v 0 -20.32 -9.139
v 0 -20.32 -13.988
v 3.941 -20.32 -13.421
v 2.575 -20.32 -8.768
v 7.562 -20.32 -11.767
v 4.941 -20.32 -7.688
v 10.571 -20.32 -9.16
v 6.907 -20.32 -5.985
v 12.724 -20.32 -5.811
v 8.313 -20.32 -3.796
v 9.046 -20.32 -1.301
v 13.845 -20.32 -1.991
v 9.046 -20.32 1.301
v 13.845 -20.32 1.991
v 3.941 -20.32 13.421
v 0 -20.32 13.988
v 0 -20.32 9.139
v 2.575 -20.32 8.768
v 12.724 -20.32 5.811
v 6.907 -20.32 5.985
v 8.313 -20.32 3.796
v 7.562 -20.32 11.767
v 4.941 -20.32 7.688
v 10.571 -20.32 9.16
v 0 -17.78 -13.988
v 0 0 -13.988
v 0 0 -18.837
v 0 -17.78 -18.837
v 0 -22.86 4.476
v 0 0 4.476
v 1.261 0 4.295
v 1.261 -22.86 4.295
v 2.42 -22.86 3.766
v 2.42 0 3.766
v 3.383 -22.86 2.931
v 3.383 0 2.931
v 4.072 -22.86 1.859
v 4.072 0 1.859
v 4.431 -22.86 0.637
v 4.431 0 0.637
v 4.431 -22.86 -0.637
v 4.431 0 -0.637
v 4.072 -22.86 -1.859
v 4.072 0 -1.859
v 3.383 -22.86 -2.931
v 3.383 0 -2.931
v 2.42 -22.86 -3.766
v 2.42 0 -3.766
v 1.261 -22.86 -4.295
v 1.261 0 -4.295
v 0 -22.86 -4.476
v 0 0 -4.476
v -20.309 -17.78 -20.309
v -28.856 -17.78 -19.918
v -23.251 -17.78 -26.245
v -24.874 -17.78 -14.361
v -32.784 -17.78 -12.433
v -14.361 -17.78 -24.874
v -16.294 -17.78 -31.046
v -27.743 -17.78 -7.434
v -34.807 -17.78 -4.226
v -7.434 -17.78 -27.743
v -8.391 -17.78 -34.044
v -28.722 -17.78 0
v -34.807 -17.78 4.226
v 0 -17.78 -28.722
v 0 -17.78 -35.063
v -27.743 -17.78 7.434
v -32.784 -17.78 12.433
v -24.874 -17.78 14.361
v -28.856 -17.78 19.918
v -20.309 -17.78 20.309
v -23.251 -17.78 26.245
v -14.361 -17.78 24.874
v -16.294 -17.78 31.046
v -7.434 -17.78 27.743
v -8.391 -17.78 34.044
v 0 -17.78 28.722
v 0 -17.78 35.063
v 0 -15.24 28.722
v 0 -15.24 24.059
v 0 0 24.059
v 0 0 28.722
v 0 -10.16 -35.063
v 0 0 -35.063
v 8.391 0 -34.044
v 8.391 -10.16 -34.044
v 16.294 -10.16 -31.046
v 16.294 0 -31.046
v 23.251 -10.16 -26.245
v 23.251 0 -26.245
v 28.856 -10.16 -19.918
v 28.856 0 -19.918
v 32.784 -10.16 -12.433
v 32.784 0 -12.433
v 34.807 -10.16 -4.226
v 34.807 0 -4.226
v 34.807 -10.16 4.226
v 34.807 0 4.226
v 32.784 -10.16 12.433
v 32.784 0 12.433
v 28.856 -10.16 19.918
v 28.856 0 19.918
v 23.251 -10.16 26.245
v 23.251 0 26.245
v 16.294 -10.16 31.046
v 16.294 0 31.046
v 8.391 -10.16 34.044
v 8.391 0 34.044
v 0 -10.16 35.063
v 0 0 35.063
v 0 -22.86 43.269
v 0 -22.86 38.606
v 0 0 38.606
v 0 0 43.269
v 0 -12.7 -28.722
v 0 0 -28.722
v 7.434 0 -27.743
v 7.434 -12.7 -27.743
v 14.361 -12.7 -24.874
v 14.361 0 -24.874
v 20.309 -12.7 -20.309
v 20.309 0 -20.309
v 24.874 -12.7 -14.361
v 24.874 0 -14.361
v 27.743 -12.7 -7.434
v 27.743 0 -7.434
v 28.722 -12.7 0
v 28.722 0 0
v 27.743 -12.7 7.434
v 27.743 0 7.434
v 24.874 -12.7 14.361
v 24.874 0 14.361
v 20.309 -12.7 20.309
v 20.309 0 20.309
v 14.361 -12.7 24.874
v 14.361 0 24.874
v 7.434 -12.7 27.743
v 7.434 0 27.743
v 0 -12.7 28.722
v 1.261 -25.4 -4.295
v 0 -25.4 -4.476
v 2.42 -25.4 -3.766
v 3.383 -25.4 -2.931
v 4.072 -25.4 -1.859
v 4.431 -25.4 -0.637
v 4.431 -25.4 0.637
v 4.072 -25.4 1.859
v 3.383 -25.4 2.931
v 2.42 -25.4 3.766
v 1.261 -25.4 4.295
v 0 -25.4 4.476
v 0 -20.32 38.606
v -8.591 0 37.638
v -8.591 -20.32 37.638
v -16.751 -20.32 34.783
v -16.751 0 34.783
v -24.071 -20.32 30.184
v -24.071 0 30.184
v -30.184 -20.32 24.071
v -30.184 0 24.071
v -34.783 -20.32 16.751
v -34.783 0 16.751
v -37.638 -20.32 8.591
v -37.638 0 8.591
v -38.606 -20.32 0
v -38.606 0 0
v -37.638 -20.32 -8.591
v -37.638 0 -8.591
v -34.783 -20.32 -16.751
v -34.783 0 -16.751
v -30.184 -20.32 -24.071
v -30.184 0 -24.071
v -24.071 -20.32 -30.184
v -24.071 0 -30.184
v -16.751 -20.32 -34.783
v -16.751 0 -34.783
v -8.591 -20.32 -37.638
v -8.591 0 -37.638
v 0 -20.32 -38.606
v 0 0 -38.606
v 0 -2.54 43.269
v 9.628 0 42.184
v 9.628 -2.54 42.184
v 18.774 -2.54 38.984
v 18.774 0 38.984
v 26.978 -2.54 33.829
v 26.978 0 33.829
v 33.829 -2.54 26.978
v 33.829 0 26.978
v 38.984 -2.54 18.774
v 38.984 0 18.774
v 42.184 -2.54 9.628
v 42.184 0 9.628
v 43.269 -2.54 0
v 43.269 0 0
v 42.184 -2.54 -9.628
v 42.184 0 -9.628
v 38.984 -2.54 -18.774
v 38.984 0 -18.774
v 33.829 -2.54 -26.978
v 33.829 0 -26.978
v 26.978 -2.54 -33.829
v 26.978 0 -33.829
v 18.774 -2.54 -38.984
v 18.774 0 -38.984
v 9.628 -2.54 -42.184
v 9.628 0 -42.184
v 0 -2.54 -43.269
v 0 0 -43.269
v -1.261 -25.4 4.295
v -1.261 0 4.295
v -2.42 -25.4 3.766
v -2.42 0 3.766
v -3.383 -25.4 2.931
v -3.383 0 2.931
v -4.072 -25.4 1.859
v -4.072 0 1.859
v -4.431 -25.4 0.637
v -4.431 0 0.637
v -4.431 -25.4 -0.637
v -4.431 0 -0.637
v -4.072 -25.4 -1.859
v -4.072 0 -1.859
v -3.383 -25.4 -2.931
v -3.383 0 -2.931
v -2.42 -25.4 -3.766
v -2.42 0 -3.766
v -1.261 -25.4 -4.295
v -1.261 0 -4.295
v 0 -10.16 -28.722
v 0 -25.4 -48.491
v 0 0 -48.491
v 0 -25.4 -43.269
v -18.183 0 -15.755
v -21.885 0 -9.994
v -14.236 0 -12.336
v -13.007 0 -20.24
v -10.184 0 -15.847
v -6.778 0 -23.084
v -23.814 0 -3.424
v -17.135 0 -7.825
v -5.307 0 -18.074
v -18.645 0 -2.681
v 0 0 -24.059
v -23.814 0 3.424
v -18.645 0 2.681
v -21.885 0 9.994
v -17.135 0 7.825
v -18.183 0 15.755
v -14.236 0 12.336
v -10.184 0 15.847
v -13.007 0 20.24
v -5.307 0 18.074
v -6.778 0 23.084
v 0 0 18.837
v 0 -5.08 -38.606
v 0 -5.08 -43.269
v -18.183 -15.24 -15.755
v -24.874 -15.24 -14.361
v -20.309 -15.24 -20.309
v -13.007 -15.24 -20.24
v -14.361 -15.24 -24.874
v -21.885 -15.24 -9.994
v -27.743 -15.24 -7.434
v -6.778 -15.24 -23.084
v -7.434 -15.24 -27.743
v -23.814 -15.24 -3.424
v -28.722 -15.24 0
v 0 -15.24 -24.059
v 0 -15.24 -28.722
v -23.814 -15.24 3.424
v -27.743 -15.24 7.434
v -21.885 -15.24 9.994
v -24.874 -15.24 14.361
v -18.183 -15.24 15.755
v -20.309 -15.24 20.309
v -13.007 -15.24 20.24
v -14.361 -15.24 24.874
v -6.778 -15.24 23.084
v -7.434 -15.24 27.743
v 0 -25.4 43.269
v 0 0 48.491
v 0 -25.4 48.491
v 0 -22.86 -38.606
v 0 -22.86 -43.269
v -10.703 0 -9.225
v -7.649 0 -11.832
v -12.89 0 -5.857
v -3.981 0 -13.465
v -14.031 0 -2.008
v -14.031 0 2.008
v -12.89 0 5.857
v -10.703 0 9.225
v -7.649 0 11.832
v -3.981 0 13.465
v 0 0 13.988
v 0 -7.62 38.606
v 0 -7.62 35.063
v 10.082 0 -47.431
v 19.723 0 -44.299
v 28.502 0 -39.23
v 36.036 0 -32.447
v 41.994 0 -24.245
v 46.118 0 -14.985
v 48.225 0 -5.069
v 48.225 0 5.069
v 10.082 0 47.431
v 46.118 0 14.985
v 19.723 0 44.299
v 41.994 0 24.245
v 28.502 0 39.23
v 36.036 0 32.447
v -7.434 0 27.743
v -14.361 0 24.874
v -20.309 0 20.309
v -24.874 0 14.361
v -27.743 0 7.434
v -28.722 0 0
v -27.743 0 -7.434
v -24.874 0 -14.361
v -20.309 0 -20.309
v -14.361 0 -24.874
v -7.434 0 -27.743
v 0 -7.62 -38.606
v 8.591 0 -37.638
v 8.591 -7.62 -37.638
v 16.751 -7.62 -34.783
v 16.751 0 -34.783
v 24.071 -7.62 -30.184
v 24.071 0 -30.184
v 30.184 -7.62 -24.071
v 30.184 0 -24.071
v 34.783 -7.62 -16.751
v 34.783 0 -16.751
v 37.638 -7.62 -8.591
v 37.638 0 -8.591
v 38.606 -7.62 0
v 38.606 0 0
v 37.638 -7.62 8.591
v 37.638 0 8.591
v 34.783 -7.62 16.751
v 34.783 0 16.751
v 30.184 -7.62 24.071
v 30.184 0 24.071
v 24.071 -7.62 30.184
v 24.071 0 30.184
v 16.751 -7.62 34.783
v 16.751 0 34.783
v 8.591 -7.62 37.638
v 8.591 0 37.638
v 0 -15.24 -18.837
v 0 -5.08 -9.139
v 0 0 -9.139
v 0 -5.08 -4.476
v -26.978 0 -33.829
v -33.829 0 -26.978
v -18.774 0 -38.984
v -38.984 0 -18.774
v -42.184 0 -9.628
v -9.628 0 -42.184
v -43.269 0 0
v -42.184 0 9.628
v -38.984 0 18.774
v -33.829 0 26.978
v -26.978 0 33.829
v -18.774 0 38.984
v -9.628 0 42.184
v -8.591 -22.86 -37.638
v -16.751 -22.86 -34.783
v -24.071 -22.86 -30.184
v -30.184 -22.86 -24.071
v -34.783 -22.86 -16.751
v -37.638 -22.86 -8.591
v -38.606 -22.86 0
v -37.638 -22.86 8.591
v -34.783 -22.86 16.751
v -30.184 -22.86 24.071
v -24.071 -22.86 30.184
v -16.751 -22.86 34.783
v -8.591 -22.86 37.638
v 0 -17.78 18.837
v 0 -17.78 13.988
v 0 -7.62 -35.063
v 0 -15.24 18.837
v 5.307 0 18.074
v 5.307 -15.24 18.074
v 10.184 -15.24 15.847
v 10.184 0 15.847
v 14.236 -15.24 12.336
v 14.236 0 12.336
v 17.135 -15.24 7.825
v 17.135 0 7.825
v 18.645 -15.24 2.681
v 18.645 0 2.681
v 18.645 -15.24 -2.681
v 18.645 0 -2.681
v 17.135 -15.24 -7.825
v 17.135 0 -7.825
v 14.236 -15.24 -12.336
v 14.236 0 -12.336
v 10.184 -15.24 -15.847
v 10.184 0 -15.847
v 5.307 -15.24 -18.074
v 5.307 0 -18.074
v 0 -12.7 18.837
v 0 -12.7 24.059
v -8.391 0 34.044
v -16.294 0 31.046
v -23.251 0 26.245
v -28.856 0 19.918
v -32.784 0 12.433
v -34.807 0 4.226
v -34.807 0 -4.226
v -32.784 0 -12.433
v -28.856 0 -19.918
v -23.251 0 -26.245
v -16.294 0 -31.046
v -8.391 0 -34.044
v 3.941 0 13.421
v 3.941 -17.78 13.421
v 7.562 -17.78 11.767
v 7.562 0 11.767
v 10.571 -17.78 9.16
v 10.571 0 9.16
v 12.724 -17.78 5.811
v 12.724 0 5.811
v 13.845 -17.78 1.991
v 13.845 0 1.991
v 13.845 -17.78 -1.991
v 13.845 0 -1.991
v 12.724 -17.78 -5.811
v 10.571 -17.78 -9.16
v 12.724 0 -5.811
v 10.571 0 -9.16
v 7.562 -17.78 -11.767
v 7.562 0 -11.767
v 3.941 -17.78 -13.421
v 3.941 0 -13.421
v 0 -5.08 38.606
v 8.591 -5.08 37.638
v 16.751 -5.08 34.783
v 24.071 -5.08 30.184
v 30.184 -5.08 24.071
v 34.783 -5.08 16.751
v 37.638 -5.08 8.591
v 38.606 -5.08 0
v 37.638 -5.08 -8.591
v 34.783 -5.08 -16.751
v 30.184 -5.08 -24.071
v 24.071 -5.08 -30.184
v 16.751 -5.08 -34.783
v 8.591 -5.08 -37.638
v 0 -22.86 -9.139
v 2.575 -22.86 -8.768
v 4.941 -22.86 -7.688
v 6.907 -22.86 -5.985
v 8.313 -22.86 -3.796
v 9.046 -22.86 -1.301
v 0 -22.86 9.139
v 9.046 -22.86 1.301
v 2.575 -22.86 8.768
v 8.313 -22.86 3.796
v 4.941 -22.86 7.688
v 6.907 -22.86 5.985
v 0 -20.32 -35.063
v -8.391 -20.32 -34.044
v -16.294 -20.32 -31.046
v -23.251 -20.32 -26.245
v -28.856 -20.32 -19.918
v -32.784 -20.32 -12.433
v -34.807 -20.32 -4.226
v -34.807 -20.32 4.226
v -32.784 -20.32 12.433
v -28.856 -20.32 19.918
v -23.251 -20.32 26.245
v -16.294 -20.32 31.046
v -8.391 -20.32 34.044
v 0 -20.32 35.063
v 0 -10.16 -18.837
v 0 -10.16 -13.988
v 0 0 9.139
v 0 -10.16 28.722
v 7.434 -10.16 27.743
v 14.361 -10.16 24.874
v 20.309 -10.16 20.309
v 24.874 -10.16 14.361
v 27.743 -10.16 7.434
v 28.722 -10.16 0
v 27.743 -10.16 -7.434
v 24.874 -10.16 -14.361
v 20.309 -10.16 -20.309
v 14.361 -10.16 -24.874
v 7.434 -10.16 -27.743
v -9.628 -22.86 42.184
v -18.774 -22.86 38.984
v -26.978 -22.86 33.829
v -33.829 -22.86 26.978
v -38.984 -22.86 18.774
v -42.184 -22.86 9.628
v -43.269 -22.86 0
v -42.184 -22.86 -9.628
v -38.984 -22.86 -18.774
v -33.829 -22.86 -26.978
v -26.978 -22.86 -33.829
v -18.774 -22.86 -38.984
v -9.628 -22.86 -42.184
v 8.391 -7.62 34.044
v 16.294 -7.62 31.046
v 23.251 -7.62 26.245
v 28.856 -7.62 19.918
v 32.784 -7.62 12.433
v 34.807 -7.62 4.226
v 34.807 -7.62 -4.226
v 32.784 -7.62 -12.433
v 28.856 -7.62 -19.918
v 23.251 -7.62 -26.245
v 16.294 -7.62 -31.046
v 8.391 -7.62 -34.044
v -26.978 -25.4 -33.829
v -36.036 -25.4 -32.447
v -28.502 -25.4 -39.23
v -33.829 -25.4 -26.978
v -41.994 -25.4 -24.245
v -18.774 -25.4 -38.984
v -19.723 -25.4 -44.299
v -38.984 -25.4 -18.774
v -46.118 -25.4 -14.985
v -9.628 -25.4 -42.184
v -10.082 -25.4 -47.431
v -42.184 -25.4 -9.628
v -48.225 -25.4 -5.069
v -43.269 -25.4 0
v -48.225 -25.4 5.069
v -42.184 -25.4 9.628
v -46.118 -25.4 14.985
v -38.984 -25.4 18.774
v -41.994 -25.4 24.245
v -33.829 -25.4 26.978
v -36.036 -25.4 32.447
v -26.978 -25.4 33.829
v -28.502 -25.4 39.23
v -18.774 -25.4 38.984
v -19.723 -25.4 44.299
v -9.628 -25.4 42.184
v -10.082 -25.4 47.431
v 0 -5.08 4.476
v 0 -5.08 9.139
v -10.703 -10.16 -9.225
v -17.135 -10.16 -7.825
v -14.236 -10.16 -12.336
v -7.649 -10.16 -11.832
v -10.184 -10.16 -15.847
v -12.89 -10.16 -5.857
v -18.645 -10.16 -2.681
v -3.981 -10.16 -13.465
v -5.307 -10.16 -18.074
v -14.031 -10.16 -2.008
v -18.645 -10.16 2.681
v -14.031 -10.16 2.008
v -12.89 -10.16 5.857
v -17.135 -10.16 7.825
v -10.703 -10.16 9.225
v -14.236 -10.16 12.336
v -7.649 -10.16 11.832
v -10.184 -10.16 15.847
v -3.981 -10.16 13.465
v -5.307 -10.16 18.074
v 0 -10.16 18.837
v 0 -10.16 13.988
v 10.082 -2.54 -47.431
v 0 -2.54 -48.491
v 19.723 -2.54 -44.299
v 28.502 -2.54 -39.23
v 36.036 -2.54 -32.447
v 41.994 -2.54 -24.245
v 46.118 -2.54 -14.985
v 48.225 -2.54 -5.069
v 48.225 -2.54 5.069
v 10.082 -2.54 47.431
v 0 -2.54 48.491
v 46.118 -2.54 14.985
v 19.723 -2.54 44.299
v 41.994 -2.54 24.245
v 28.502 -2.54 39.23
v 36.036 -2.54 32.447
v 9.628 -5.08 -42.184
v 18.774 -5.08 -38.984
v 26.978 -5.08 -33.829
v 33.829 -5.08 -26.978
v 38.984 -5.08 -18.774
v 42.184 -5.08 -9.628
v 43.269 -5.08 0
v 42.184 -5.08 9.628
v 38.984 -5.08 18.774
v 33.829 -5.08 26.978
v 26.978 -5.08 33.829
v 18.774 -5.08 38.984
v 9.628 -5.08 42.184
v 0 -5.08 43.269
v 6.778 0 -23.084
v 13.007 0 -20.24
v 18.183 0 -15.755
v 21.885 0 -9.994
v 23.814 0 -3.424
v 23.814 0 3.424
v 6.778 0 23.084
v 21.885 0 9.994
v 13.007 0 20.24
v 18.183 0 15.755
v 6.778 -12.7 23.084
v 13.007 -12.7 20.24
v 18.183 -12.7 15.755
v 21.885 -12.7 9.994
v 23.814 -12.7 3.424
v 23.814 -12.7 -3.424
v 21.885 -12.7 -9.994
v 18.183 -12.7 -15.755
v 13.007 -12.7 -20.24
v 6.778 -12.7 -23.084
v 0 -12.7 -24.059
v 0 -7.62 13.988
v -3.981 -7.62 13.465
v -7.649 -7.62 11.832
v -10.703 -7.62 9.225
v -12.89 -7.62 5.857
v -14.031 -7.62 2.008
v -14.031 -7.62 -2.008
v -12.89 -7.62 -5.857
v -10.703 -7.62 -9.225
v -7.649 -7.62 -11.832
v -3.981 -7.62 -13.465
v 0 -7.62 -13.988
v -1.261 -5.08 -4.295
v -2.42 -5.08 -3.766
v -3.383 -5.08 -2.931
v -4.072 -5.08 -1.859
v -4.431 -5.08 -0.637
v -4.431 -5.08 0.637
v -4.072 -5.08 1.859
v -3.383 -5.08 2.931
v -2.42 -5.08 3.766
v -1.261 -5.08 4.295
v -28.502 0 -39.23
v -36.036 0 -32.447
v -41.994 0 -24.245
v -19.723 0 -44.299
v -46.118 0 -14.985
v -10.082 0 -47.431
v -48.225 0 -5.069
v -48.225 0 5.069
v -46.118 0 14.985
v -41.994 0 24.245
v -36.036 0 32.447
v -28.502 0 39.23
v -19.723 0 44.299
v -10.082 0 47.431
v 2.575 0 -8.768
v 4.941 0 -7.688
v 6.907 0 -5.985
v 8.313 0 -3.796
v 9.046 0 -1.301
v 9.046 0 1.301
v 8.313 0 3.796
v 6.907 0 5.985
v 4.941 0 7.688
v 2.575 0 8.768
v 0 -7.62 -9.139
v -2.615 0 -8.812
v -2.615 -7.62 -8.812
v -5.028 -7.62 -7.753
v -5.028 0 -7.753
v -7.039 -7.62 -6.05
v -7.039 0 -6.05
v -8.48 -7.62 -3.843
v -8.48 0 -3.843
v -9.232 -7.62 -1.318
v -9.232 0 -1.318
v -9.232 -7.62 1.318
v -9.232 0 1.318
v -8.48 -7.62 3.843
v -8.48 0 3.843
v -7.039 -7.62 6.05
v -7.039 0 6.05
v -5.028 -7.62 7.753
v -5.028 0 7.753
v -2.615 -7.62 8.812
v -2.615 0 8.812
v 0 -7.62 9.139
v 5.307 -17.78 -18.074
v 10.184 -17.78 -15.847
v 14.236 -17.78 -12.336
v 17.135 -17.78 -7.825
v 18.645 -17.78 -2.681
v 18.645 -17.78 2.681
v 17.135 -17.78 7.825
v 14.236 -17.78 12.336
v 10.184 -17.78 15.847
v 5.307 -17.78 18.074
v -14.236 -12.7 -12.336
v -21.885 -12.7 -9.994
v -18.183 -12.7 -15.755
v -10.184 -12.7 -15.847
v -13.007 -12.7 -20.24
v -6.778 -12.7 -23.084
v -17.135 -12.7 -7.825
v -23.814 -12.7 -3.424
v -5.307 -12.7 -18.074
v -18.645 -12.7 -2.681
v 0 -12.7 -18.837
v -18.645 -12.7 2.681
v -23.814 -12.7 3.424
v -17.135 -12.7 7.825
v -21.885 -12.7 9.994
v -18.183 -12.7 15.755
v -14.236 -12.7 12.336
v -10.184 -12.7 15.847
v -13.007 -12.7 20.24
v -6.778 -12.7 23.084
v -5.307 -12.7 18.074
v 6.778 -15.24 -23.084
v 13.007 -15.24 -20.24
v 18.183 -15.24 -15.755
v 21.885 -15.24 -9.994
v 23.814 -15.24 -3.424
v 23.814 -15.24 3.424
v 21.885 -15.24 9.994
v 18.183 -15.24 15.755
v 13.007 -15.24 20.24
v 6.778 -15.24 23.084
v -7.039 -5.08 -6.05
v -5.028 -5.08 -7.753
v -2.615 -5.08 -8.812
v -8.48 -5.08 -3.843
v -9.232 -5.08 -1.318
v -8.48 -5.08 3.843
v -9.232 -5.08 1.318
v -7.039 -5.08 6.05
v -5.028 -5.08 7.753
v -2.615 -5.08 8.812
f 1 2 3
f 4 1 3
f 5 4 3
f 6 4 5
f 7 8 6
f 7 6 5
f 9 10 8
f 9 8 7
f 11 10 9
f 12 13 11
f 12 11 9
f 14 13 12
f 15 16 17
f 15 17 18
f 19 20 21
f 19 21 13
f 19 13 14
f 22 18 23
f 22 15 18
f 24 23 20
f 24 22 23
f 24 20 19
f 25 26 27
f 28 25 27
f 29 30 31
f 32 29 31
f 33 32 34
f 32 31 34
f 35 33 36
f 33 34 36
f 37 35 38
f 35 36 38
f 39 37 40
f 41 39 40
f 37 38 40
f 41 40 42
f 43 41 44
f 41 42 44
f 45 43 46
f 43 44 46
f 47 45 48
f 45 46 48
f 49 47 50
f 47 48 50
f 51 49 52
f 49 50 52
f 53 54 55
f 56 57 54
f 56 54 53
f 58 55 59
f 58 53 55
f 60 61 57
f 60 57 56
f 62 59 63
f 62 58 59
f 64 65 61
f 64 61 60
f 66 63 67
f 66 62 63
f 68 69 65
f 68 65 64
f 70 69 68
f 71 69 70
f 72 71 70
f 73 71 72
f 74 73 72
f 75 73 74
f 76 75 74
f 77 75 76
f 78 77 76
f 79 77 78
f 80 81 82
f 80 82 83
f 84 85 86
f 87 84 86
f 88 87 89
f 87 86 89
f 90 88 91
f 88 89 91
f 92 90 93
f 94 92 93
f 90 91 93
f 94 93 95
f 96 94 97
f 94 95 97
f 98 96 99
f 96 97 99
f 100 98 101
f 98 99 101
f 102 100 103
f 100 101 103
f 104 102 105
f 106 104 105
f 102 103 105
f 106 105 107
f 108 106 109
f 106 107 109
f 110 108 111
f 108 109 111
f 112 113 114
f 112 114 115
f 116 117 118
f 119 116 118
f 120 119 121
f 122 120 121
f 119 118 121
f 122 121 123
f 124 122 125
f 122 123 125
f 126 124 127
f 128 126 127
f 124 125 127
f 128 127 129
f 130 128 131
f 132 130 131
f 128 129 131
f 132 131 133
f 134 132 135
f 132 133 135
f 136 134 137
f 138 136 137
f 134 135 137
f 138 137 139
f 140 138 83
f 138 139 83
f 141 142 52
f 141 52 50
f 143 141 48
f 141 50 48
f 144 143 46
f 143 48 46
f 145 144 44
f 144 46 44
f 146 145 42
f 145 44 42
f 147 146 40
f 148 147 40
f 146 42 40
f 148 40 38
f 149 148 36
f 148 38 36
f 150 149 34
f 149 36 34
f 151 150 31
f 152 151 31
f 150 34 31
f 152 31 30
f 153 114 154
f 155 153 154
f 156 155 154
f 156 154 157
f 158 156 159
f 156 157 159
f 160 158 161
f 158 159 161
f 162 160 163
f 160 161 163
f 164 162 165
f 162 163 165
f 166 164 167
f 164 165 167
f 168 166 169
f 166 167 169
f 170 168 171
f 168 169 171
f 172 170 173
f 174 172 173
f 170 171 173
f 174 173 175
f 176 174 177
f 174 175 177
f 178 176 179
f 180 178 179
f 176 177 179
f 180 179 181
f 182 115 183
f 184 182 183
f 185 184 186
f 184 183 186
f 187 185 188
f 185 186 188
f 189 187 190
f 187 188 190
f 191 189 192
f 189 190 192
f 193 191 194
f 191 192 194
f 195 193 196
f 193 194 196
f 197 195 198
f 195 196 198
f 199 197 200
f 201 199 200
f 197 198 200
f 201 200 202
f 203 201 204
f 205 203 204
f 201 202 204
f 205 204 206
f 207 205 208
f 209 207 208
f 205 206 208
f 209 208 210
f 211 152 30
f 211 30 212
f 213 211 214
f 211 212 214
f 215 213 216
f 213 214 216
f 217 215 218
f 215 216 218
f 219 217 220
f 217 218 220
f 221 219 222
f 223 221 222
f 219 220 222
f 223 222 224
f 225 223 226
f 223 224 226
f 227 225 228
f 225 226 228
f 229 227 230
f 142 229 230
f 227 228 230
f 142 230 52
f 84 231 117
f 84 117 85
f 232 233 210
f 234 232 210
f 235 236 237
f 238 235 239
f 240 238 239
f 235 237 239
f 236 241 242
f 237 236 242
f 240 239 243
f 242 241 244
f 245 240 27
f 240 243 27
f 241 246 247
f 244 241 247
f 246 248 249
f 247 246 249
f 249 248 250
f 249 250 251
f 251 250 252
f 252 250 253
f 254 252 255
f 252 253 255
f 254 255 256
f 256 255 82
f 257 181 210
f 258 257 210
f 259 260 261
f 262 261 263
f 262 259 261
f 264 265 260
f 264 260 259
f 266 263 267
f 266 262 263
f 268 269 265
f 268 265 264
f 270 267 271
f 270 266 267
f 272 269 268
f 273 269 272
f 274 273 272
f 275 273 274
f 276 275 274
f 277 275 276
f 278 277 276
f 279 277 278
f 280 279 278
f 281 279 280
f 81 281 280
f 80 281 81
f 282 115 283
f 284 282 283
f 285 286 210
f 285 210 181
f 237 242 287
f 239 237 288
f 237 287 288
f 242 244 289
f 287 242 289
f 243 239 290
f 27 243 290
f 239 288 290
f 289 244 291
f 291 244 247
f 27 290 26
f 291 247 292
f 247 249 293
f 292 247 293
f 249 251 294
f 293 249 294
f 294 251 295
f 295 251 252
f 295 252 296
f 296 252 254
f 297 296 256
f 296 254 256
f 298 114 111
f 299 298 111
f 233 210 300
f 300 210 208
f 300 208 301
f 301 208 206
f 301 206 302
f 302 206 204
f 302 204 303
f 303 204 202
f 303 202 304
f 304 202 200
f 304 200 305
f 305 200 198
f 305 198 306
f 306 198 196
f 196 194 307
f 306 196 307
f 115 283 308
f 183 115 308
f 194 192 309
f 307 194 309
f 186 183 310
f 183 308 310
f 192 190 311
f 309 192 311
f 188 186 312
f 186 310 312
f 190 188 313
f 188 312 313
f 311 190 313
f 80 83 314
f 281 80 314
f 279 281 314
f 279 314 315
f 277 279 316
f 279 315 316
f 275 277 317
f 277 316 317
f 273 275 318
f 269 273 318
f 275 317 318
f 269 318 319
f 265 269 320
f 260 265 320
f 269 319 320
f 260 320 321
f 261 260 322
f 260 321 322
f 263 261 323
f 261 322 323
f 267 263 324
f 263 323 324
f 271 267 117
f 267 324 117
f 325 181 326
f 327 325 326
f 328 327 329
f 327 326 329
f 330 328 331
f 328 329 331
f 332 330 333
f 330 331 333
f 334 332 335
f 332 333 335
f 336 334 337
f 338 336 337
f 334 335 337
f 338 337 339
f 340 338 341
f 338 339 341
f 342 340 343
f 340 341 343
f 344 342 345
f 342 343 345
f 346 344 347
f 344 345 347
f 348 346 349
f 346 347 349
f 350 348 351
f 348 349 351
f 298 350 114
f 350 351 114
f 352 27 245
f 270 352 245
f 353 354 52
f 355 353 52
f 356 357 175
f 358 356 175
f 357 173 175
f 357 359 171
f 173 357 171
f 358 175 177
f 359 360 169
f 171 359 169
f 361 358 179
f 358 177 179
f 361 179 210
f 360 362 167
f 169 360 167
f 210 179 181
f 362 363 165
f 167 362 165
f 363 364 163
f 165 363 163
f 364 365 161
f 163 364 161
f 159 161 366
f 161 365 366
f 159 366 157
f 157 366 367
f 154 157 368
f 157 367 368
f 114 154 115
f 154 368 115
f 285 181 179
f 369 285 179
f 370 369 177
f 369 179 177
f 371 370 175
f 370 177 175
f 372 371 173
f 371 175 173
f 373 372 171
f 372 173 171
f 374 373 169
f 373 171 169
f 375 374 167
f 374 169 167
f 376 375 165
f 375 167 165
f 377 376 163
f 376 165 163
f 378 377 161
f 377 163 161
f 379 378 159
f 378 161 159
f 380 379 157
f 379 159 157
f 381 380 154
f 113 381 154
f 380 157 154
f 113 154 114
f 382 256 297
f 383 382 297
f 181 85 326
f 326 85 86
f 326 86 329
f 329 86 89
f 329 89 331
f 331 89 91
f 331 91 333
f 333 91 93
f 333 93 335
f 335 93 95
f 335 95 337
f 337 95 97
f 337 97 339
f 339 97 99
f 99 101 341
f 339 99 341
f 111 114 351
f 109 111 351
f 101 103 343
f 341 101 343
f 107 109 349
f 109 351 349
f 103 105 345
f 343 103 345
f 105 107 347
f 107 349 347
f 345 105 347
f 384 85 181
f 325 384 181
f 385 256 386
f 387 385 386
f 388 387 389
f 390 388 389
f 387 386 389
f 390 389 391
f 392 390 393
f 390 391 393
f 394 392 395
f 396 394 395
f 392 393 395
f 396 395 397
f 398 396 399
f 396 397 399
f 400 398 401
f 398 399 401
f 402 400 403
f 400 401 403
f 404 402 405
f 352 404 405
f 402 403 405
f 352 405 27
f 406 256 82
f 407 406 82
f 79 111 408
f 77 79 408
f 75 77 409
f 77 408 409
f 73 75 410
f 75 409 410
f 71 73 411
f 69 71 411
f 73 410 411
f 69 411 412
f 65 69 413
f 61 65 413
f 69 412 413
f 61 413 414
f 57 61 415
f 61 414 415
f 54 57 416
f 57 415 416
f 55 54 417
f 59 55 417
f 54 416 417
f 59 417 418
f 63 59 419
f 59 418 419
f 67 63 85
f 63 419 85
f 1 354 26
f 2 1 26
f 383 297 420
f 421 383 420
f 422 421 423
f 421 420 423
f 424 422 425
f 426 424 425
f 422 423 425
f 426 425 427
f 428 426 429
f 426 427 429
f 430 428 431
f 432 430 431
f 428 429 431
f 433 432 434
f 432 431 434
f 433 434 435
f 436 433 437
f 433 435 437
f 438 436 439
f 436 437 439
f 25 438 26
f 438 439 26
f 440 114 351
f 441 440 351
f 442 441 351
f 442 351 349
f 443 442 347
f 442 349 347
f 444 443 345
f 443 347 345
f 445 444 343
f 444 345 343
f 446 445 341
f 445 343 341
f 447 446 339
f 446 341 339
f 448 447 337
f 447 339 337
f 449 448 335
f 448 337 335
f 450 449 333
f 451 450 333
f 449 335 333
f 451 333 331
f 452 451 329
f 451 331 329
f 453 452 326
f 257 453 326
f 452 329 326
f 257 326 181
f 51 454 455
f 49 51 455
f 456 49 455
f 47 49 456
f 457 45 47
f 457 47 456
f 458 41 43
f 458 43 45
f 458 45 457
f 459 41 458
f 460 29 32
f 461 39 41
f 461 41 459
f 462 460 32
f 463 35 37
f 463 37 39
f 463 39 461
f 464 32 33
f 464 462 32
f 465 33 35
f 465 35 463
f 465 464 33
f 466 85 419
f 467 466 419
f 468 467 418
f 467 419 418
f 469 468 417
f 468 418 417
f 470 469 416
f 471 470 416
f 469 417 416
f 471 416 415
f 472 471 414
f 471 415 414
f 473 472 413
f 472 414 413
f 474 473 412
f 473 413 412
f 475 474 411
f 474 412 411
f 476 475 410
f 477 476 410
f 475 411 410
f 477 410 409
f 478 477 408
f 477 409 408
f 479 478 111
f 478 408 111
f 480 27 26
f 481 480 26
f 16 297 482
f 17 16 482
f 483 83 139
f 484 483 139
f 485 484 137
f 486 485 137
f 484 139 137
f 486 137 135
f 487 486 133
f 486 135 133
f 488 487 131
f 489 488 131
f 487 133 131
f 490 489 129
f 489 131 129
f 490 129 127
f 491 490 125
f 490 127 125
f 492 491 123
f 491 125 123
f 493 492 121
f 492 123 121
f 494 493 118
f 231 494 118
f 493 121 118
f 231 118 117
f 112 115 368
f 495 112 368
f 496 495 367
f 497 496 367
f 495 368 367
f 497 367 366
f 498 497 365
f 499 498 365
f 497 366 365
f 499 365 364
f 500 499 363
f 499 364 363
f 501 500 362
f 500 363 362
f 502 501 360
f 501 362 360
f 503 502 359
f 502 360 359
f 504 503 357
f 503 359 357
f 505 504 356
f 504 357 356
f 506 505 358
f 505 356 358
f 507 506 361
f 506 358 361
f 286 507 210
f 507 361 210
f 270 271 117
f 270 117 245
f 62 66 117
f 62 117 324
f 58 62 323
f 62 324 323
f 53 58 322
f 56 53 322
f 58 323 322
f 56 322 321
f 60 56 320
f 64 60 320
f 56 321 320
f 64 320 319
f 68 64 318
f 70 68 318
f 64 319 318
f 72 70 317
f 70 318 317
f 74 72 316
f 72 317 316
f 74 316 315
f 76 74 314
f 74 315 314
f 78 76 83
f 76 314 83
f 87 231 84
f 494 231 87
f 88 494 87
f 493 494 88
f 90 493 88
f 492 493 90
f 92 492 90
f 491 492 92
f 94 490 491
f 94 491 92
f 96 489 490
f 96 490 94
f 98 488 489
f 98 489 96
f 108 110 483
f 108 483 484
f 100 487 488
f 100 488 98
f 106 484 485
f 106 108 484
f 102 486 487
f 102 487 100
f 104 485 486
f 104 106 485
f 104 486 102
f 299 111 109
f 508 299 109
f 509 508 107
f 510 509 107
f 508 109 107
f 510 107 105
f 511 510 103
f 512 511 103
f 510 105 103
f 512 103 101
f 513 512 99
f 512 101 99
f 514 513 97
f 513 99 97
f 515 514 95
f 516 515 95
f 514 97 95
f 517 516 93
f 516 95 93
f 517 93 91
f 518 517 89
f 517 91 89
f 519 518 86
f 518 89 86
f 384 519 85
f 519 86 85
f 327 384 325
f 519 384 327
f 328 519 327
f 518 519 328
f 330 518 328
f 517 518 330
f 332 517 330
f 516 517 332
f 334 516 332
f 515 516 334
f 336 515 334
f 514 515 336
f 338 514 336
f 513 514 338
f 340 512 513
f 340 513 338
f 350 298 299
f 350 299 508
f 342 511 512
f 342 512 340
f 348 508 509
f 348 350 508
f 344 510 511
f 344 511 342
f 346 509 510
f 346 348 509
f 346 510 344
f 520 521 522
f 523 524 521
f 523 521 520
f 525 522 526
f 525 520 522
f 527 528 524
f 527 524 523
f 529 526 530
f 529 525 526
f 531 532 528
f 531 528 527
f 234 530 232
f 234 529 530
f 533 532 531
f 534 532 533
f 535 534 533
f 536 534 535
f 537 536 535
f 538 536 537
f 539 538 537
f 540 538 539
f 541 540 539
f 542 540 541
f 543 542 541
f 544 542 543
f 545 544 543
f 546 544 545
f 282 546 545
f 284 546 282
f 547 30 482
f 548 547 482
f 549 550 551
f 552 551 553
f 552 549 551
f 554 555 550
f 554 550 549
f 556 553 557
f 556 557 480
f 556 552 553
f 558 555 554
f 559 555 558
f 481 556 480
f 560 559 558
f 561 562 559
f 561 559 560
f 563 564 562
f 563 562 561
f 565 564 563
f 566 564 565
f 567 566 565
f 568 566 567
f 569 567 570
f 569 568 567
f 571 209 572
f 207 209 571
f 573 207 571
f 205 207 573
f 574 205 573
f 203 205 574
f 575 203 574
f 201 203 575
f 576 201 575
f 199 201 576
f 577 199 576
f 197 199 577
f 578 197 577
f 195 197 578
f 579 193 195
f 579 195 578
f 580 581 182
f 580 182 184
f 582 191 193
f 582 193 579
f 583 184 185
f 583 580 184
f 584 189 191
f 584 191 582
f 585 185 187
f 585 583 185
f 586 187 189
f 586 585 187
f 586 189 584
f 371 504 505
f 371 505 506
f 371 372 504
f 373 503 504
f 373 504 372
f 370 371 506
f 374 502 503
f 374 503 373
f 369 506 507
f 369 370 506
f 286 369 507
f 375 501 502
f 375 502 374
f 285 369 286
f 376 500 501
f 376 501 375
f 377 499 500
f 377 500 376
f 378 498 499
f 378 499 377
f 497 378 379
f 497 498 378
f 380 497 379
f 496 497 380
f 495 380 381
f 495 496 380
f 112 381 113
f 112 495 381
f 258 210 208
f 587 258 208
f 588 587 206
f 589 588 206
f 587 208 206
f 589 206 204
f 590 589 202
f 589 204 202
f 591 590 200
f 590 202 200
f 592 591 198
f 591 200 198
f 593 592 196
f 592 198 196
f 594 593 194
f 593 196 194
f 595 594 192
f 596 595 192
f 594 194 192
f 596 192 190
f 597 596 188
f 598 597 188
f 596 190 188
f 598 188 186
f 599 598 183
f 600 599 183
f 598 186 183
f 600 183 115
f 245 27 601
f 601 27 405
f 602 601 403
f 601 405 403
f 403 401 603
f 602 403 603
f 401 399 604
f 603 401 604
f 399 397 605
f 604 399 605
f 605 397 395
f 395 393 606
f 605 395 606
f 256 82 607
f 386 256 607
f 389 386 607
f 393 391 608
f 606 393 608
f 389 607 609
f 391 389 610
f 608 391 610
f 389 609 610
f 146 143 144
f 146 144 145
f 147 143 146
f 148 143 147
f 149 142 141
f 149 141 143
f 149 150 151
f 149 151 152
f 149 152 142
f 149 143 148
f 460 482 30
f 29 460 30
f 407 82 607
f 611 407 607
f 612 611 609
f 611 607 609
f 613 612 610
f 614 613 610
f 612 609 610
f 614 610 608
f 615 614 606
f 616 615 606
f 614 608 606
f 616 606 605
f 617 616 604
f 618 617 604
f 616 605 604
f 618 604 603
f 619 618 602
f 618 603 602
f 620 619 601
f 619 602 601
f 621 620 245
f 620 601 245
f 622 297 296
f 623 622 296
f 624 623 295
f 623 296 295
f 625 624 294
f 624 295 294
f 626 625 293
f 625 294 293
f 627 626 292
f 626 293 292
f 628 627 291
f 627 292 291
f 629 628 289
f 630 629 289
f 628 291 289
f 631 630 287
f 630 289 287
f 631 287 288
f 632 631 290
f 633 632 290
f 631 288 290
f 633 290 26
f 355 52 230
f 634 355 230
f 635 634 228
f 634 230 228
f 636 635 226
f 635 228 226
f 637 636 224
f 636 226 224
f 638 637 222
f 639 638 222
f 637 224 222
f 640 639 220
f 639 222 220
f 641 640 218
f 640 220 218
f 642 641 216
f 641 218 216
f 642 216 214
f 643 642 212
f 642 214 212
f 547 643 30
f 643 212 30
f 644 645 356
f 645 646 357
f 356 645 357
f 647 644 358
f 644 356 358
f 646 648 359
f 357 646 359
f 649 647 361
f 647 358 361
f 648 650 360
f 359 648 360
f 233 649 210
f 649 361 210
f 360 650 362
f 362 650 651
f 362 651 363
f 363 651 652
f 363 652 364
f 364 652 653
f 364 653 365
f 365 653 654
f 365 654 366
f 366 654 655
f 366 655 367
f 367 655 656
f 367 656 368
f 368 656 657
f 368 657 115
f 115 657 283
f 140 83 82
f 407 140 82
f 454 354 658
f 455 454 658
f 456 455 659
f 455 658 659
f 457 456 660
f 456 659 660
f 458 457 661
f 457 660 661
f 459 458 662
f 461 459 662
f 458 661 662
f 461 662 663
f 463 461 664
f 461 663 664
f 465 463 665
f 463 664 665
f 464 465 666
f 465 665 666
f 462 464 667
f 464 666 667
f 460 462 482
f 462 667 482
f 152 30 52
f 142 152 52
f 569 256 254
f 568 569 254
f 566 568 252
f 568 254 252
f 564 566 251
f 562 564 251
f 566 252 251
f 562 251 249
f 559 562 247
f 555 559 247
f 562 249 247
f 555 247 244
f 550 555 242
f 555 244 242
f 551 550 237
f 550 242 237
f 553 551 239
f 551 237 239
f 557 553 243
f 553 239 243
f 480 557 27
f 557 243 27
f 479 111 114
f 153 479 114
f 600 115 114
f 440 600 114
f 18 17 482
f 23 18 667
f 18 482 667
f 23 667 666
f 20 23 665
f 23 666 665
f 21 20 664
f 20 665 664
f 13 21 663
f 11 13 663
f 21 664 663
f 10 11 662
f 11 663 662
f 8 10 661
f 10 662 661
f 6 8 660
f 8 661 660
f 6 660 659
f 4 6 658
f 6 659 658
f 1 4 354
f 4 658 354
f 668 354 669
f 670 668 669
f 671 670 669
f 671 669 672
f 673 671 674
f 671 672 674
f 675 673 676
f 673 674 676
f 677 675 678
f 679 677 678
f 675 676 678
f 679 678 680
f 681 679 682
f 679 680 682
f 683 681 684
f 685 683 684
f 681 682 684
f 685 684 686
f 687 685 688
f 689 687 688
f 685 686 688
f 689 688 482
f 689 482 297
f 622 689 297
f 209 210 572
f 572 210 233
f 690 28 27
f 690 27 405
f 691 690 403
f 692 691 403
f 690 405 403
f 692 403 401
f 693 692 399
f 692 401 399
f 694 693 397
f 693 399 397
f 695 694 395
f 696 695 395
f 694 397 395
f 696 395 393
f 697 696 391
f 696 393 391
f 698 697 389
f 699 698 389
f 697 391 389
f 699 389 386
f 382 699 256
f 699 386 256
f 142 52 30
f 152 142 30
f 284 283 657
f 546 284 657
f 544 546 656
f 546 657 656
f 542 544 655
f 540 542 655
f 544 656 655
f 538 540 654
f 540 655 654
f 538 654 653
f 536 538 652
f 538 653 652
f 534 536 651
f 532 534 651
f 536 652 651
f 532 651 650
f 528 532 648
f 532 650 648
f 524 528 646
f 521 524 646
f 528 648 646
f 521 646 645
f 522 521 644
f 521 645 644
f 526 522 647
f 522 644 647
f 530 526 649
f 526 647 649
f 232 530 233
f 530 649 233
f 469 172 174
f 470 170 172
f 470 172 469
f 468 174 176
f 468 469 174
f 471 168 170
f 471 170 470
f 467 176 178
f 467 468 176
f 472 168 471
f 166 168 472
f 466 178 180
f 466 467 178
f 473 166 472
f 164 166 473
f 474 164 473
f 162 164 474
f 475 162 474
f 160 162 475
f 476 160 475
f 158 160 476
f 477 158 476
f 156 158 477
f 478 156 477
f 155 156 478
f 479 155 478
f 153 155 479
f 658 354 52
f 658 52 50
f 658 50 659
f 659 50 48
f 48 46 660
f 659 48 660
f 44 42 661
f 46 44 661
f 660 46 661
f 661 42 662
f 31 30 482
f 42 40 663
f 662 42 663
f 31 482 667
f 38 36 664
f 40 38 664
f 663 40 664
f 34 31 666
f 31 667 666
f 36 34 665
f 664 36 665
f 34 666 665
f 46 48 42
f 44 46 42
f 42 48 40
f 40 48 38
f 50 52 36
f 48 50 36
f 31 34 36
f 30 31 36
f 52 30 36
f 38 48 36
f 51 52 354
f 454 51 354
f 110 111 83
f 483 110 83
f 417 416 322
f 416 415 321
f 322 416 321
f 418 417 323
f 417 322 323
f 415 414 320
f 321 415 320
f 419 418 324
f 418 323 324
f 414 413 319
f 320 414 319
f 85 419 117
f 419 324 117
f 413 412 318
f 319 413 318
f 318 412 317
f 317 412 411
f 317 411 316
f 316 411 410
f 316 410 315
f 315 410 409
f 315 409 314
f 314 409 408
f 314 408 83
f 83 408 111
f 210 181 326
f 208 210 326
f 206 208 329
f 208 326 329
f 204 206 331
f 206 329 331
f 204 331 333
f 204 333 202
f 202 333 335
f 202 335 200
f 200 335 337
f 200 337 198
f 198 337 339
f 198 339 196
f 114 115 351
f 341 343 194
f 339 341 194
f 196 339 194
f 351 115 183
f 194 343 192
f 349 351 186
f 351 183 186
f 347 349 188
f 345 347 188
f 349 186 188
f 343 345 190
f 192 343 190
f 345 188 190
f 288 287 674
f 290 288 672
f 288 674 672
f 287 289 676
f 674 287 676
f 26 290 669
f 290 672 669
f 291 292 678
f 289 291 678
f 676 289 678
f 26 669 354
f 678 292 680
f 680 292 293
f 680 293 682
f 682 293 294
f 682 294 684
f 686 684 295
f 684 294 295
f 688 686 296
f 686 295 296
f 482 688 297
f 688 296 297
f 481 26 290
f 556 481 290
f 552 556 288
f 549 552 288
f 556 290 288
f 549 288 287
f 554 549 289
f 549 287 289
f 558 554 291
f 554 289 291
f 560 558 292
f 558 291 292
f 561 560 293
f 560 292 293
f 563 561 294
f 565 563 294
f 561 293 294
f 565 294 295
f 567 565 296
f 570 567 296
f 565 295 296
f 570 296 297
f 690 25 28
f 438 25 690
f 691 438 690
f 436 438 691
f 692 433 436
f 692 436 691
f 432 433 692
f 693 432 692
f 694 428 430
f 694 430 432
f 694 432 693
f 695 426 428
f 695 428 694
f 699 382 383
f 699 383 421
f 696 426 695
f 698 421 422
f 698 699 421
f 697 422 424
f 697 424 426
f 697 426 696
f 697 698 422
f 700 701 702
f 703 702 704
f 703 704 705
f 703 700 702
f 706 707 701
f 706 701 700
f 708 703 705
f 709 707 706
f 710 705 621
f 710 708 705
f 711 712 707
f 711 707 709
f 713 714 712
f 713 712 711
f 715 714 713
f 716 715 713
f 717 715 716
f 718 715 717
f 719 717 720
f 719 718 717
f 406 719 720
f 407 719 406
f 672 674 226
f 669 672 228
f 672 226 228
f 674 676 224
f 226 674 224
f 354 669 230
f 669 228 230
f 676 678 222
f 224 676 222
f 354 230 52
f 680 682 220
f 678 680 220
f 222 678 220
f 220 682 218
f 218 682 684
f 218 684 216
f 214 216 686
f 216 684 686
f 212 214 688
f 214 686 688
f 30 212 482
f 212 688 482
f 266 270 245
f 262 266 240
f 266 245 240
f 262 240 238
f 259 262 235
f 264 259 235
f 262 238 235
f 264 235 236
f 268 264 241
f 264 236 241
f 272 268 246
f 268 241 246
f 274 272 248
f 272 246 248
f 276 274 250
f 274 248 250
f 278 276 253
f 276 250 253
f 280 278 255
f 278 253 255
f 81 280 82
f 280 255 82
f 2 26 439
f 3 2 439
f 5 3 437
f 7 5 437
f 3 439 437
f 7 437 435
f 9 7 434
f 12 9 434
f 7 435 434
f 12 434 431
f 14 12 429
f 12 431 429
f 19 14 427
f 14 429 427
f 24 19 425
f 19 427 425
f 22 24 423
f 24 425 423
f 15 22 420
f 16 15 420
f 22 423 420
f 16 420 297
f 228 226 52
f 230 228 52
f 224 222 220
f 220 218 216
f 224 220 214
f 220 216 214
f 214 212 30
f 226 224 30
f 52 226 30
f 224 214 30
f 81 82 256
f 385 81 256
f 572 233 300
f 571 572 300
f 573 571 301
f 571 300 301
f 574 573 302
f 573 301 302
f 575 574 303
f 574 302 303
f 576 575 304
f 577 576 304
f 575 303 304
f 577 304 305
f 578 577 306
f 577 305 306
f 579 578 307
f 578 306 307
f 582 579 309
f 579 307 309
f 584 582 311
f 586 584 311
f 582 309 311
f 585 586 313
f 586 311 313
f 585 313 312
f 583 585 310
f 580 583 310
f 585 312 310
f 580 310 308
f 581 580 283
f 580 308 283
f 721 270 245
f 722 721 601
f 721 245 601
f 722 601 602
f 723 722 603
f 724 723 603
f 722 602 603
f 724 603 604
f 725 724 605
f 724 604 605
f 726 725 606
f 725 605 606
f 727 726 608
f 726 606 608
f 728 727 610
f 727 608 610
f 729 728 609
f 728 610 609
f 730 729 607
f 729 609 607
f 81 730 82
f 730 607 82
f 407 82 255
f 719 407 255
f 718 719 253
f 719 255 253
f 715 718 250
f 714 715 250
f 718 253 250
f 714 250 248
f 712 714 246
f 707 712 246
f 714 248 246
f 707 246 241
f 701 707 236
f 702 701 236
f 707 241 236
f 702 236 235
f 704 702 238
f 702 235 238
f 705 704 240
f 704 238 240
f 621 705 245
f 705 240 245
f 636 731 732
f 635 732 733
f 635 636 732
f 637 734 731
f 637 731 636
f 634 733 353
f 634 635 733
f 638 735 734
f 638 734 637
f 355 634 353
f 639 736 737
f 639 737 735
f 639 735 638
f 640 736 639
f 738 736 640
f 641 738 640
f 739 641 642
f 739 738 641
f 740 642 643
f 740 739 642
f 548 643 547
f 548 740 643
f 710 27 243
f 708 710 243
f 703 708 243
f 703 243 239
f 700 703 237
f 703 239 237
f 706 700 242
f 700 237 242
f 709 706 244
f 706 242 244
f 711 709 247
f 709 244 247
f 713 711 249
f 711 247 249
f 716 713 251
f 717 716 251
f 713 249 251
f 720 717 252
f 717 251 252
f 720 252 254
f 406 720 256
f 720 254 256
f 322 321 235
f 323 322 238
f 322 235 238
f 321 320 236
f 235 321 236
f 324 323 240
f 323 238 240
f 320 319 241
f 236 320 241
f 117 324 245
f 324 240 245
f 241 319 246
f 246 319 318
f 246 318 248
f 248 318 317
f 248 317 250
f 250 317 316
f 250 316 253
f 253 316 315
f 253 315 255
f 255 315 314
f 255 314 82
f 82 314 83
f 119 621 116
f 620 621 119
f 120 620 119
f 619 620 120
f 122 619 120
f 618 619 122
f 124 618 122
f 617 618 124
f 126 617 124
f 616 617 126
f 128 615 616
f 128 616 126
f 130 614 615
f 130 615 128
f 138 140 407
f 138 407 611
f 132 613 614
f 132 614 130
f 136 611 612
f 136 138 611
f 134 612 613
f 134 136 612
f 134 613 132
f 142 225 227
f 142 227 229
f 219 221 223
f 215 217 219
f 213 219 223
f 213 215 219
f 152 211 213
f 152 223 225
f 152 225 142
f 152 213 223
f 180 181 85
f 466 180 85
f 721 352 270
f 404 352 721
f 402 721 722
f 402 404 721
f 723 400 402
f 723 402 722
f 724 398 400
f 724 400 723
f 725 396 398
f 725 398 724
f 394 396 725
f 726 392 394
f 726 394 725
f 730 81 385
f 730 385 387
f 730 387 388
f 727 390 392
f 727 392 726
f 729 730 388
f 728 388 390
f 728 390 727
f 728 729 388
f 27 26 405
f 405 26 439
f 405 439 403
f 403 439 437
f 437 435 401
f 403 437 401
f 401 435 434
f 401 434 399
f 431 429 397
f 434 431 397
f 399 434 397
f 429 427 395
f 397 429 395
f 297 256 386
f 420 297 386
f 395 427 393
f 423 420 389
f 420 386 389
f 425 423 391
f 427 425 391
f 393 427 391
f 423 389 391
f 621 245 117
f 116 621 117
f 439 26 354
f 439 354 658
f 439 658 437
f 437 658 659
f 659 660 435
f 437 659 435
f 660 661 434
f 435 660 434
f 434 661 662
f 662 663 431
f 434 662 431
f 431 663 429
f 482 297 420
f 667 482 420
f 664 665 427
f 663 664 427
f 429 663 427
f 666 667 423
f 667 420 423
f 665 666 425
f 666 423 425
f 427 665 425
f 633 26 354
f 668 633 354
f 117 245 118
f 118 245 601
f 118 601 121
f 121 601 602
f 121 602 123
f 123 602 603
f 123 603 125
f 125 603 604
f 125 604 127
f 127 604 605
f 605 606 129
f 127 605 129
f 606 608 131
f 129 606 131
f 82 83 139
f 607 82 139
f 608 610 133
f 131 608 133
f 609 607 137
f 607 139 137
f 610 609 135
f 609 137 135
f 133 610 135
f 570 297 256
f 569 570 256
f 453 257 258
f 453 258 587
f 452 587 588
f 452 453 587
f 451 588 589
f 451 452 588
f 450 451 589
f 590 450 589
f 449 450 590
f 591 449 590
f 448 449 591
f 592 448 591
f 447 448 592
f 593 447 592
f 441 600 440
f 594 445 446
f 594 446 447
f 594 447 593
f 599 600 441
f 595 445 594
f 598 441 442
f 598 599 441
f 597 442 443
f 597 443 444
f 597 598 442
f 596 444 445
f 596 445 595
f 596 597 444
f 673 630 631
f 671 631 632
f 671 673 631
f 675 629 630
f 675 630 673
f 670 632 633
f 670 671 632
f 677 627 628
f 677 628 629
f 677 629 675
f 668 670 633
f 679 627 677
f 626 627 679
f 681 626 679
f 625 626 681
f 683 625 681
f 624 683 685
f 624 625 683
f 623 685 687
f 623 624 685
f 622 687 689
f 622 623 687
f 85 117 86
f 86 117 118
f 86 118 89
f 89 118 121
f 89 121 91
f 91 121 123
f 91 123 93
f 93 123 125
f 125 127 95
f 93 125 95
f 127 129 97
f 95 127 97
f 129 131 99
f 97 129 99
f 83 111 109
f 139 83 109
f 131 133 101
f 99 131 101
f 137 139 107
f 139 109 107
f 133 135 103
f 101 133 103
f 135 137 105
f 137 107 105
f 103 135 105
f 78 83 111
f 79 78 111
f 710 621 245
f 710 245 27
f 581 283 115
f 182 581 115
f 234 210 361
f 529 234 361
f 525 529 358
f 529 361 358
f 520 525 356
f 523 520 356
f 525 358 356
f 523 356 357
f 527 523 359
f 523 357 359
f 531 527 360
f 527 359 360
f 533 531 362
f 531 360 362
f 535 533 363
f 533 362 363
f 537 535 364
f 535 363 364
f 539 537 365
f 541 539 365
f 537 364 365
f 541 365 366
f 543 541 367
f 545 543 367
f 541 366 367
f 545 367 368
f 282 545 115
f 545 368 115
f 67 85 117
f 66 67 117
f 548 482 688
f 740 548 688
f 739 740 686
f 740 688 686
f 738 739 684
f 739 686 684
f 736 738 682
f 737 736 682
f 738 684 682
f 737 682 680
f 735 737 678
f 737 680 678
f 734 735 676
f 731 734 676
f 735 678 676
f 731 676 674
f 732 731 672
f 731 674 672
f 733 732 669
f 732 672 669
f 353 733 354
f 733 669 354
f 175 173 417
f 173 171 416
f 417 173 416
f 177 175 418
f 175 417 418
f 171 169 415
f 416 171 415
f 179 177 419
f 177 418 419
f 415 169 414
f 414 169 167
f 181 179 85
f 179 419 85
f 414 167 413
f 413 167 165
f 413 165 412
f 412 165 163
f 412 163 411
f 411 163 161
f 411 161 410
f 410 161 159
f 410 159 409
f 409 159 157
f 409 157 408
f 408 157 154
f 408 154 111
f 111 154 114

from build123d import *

# Parameters (mm, degrees)
F1_DEPTH  = 2.54
F2_DEPTH  = 5.08
F3_DEPTH  = 7.62
F4_DEPTH  = 10.16
F5_DEPTH  = 12.7
F6_DEPTH  = 15.24
F7_DEPTH  = 17.78
F8_DEPTH  = 20.32
F9_DEPTH  = 22.86
F10_DEPTH = 25.4
F11_DEPTH = 25.4


with BuildPart() as f1:
    # F0 (on Front) → F1 (new body)
    with BuildSketch(Plane.XZ):
        with BuildLine():
            Line((0, 48.490912), (0, 43.268811))
            ThreePointArc((0, 43.268811), (43.268811, 0), (0, -43.268811))
            Line((0, -43.268811), (0, -48.490912))
            ThreePointArc((0, -48.490912), (48.490912, 0), (0, 48.490912))
        make_face()
    extrude(amount=F1_DEPTH)


with BuildPart() as f2:
    # F0 (on Front) → F2 (new body)
    with BuildSketch(Plane.XZ):
        with BuildLine():
            ThreePointArc((0, -4.476084), (-4.476084, 0), (0, 4.476084))
            Line((0, 4.476084), (0, 9.138672))
            ThreePointArc((0, 9.138672), (-9.327078, 0), (0, -9.138672))
            Line((0, -9.138672), (0, -4.476084))
        make_face()
        with BuildLine():
            Line((0, 43.268811), (0, 38.606223))
            ThreePointArc((0, 38.606223), (38.606223, 0), (0, -38.606223))
            Line((0, -38.606223), (0, -43.268811))
            ThreePointArc((0, -43.268811), (43.268811, 0), (0, 43.268811))
        make_face()
    extrude(amount=F2_DEPTH)


with BuildPart() as f3:
    # F0 (on Front) → F3 (new body)
    with BuildSketch(Plane.XZ):
        with BuildLine():
            ThreePointArc((0, -9.138672), (-9.327078, 0), (0, 9.138672))
            Line((0, 9.138672), (0, 13.987763))
            ThreePointArc((0, 13.987763), (-14.17551, 0), (0, -13.987763))
            Line((0, -13.987763), (0, -9.138672))
        make_face()
        with BuildLine():
            Line((0, 38.606223), (0, 35.062656))
            ThreePointArc((0, 35.062656), (35.062656, 0), (0, -35.062656))
            Line((0, -35.062656), (0, -38.606223))
            ThreePointArc((0, -38.606223), (38.606223, 0), (0, 38.606223))
        make_face()
    extrude(amount=F3_DEPTH)


with BuildPart() as f4:
    # F0 (on Front) → F4 (new body)
    with BuildSketch(Plane.XZ):
        with BuildLine():
            ThreePointArc((0, -13.987763), (-14.17551, 0), (0, 13.987763))
            Line((0, 13.987763), (0, 18.836854))
            ThreePointArc((0, 18.836854), (-18.836854, 0), (0, -18.836854))
            Line((0, -18.836854), (0, -13.987763))
        make_face()
        with BuildLine():
            Line((0, 35.062656), (0, 28.721539))
            ThreePointArc((0, 28.721539), (28.721539, 0), (0, -28.721539))
            Line((0, -28.721539), (0, -35.062656))
            ThreePointArc((0, -35.062656), (35.062656, 0), (0, 35.062656))
        make_face()
    extrude(amount=F4_DEPTH)


with BuildPart() as f5:
    # F0 (on Front) → F5 (new body)
    with BuildSketch(Plane.XZ):
        with BuildLine():
            ThreePointArc((0, -18.836854), (-18.836854, 0), (0, 18.836854))
            Line((0, 18.836854), (0, 24.058951))
            ThreePointArc((0, 24.058951), (-24.058951, 0), (0, -24.058951))
            Line((0, -24.058951), (0, -18.836854))
        make_face()
        with BuildLine():
            Line((0, 28.721539), (0, 24.058951))
            ThreePointArc((0, 24.058951), (24.058951, 0), (0, -24.058951))
            Line((0, -24.058951), (0, -28.721539))
            ThreePointArc((0, -28.721539), (28.721539, 0), (0, 28.721539))
        make_face()
    extrude(amount=F5_DEPTH)


with BuildPart() as f6:
    # F0 (on Front) → F6 (new body)
    with BuildSketch(Plane.XZ):
        with BuildLine():
            Line((0, 24.058951), (0, 18.836854))
            ThreePointArc((0, 18.836854), (18.836854, 0), (0, -18.836854))
            Line((0, -18.836854), (0, -24.058951))
            ThreePointArc((0, -24.058951), (24.058951, 0), (0, 24.058951))
        make_face()
        with BuildLine():
            ThreePointArc((0, -24.058951), (-24.058951, 0), (0, 24.058951))
            Line((0, 24.058951), (0, 28.721539))
            ThreePointArc((0, 28.721539), (-28.721539, 0), (0, -28.721539))
            Line((0, -28.721539), (0, -24.058951))
        make_face()
    extrude(amount=F6_DEPTH)


with BuildPart() as f7:
    # F0 (on Front) → F7 (new body)
    with BuildSketch(Plane.XZ):
        with BuildLine():
            ThreePointArc((0, -28.721539), (-28.721539, 0), (0, 28.721539))
            Line((0, 28.721539), (0, 35.062656))
            ThreePointArc((0, 35.062656), (-35.062656, 0), (0, -35.062656))
            Line((0, -35.062656), (0, -28.721539))
        make_face()
        with BuildLine():
            Line((0, 18.836854), (0, 13.987763))
            ThreePointArc((0, 13.987763), (13.987763, 0), (0, -13.987763))
            Line((0, -13.987763), (0, -18.836854))
            ThreePointArc((0, -18.836854), (18.836854, 0), (0, 18.836854))
        make_face()
    extrude(amount=F7_DEPTH)


with BuildPart() as f8:
    # F0 (on Front) → F8 (new body)
    with BuildSketch(Plane.XZ):
        with BuildLine():
            Line((0, 13.987763), (0, 9.138672))
            ThreePointArc((0, 9.138672), (9.138672, 0), (0, -9.138672))
            Line((0, -9.138672), (0, -13.987763))
            ThreePointArc((0, -13.987763), (13.987763, 0), (0, 13.987763))
        make_face()
        with BuildLine():
            ThreePointArc((0, -35.062656), (-35.062656, 0), (0, 35.062656))
            Line((0, 35.062656), (0, 38.606223))
            ThreePointArc((0, 38.606223), (-38.606223, 0), (0, -38.606223))
            Line((0, -38.606223), (0, -35.062656))
        make_face()
    extrude(amount=F8_DEPTH)


with BuildPart() as f9:
    # F0 (on Front) → F9 (new body)
    with BuildSketch(Plane.XZ):
        with BuildLine():
            ThreePointArc((0, -38.606223), (-38.606223, 0), (0, 38.606223))
            Line((0, 38.606223), (0, 43.268811))
            ThreePointArc((0, 43.268811), (-43.268811, 0), (0, -43.268811))
            Line((0, -43.268811), (0, -38.606223))
        make_face()
        with BuildLine():
            Line((0, 9.138672), (0, 4.476084))
            ThreePointArc((0, 4.476084), (4.476084, 0), (0, -4.476084))
            Line((0, -4.476084), (0, -9.138672))
            ThreePointArc((0, -9.138672), (9.138672, 0), (0, 9.138672))
        make_face()
    extrude(amount=F9_DEPTH)


with BuildPart() as f10:
    # F0 (on Front) → F10 (new body)
    with BuildSketch(Plane.XZ):
        with BuildLine():
            ThreePointArc((0, -43.268811), (-43.268811, 0), (0, 43.268811))
            Line((0, 43.268811), (0, 48.490912))
            ThreePointArc((0, 48.490912), (-48.490912, 0), (0, -48.490912))
            Line((0, -48.490912), (0, -43.268811))
        make_face()
        with BuildLine():
            ThreePointArc((0, -4.476084), (4.476084, 0), (0, 4.476084))
            Line((0, 4.476084), (0, -4.476084))
        make_face()
    extrude(amount=F10_DEPTH)


with BuildPart() as f11:
    # F0 (on Front) → F11 (new body)
    with BuildSketch(Plane.XZ):
        with BuildLine():
            Line((0, -4.476084), (0, 4.476084))
            ThreePointArc((0, 4.476084), (-4.476084, 0), (0, -4.476084))
        make_face()
    extrude(amount=F11_DEPTH)


solid = Compound([f1.part, f2.part, f3.part, f4.part, f5.part, f6.part, f7.part, f8.part, f9.part, f10.part, f11.part])
